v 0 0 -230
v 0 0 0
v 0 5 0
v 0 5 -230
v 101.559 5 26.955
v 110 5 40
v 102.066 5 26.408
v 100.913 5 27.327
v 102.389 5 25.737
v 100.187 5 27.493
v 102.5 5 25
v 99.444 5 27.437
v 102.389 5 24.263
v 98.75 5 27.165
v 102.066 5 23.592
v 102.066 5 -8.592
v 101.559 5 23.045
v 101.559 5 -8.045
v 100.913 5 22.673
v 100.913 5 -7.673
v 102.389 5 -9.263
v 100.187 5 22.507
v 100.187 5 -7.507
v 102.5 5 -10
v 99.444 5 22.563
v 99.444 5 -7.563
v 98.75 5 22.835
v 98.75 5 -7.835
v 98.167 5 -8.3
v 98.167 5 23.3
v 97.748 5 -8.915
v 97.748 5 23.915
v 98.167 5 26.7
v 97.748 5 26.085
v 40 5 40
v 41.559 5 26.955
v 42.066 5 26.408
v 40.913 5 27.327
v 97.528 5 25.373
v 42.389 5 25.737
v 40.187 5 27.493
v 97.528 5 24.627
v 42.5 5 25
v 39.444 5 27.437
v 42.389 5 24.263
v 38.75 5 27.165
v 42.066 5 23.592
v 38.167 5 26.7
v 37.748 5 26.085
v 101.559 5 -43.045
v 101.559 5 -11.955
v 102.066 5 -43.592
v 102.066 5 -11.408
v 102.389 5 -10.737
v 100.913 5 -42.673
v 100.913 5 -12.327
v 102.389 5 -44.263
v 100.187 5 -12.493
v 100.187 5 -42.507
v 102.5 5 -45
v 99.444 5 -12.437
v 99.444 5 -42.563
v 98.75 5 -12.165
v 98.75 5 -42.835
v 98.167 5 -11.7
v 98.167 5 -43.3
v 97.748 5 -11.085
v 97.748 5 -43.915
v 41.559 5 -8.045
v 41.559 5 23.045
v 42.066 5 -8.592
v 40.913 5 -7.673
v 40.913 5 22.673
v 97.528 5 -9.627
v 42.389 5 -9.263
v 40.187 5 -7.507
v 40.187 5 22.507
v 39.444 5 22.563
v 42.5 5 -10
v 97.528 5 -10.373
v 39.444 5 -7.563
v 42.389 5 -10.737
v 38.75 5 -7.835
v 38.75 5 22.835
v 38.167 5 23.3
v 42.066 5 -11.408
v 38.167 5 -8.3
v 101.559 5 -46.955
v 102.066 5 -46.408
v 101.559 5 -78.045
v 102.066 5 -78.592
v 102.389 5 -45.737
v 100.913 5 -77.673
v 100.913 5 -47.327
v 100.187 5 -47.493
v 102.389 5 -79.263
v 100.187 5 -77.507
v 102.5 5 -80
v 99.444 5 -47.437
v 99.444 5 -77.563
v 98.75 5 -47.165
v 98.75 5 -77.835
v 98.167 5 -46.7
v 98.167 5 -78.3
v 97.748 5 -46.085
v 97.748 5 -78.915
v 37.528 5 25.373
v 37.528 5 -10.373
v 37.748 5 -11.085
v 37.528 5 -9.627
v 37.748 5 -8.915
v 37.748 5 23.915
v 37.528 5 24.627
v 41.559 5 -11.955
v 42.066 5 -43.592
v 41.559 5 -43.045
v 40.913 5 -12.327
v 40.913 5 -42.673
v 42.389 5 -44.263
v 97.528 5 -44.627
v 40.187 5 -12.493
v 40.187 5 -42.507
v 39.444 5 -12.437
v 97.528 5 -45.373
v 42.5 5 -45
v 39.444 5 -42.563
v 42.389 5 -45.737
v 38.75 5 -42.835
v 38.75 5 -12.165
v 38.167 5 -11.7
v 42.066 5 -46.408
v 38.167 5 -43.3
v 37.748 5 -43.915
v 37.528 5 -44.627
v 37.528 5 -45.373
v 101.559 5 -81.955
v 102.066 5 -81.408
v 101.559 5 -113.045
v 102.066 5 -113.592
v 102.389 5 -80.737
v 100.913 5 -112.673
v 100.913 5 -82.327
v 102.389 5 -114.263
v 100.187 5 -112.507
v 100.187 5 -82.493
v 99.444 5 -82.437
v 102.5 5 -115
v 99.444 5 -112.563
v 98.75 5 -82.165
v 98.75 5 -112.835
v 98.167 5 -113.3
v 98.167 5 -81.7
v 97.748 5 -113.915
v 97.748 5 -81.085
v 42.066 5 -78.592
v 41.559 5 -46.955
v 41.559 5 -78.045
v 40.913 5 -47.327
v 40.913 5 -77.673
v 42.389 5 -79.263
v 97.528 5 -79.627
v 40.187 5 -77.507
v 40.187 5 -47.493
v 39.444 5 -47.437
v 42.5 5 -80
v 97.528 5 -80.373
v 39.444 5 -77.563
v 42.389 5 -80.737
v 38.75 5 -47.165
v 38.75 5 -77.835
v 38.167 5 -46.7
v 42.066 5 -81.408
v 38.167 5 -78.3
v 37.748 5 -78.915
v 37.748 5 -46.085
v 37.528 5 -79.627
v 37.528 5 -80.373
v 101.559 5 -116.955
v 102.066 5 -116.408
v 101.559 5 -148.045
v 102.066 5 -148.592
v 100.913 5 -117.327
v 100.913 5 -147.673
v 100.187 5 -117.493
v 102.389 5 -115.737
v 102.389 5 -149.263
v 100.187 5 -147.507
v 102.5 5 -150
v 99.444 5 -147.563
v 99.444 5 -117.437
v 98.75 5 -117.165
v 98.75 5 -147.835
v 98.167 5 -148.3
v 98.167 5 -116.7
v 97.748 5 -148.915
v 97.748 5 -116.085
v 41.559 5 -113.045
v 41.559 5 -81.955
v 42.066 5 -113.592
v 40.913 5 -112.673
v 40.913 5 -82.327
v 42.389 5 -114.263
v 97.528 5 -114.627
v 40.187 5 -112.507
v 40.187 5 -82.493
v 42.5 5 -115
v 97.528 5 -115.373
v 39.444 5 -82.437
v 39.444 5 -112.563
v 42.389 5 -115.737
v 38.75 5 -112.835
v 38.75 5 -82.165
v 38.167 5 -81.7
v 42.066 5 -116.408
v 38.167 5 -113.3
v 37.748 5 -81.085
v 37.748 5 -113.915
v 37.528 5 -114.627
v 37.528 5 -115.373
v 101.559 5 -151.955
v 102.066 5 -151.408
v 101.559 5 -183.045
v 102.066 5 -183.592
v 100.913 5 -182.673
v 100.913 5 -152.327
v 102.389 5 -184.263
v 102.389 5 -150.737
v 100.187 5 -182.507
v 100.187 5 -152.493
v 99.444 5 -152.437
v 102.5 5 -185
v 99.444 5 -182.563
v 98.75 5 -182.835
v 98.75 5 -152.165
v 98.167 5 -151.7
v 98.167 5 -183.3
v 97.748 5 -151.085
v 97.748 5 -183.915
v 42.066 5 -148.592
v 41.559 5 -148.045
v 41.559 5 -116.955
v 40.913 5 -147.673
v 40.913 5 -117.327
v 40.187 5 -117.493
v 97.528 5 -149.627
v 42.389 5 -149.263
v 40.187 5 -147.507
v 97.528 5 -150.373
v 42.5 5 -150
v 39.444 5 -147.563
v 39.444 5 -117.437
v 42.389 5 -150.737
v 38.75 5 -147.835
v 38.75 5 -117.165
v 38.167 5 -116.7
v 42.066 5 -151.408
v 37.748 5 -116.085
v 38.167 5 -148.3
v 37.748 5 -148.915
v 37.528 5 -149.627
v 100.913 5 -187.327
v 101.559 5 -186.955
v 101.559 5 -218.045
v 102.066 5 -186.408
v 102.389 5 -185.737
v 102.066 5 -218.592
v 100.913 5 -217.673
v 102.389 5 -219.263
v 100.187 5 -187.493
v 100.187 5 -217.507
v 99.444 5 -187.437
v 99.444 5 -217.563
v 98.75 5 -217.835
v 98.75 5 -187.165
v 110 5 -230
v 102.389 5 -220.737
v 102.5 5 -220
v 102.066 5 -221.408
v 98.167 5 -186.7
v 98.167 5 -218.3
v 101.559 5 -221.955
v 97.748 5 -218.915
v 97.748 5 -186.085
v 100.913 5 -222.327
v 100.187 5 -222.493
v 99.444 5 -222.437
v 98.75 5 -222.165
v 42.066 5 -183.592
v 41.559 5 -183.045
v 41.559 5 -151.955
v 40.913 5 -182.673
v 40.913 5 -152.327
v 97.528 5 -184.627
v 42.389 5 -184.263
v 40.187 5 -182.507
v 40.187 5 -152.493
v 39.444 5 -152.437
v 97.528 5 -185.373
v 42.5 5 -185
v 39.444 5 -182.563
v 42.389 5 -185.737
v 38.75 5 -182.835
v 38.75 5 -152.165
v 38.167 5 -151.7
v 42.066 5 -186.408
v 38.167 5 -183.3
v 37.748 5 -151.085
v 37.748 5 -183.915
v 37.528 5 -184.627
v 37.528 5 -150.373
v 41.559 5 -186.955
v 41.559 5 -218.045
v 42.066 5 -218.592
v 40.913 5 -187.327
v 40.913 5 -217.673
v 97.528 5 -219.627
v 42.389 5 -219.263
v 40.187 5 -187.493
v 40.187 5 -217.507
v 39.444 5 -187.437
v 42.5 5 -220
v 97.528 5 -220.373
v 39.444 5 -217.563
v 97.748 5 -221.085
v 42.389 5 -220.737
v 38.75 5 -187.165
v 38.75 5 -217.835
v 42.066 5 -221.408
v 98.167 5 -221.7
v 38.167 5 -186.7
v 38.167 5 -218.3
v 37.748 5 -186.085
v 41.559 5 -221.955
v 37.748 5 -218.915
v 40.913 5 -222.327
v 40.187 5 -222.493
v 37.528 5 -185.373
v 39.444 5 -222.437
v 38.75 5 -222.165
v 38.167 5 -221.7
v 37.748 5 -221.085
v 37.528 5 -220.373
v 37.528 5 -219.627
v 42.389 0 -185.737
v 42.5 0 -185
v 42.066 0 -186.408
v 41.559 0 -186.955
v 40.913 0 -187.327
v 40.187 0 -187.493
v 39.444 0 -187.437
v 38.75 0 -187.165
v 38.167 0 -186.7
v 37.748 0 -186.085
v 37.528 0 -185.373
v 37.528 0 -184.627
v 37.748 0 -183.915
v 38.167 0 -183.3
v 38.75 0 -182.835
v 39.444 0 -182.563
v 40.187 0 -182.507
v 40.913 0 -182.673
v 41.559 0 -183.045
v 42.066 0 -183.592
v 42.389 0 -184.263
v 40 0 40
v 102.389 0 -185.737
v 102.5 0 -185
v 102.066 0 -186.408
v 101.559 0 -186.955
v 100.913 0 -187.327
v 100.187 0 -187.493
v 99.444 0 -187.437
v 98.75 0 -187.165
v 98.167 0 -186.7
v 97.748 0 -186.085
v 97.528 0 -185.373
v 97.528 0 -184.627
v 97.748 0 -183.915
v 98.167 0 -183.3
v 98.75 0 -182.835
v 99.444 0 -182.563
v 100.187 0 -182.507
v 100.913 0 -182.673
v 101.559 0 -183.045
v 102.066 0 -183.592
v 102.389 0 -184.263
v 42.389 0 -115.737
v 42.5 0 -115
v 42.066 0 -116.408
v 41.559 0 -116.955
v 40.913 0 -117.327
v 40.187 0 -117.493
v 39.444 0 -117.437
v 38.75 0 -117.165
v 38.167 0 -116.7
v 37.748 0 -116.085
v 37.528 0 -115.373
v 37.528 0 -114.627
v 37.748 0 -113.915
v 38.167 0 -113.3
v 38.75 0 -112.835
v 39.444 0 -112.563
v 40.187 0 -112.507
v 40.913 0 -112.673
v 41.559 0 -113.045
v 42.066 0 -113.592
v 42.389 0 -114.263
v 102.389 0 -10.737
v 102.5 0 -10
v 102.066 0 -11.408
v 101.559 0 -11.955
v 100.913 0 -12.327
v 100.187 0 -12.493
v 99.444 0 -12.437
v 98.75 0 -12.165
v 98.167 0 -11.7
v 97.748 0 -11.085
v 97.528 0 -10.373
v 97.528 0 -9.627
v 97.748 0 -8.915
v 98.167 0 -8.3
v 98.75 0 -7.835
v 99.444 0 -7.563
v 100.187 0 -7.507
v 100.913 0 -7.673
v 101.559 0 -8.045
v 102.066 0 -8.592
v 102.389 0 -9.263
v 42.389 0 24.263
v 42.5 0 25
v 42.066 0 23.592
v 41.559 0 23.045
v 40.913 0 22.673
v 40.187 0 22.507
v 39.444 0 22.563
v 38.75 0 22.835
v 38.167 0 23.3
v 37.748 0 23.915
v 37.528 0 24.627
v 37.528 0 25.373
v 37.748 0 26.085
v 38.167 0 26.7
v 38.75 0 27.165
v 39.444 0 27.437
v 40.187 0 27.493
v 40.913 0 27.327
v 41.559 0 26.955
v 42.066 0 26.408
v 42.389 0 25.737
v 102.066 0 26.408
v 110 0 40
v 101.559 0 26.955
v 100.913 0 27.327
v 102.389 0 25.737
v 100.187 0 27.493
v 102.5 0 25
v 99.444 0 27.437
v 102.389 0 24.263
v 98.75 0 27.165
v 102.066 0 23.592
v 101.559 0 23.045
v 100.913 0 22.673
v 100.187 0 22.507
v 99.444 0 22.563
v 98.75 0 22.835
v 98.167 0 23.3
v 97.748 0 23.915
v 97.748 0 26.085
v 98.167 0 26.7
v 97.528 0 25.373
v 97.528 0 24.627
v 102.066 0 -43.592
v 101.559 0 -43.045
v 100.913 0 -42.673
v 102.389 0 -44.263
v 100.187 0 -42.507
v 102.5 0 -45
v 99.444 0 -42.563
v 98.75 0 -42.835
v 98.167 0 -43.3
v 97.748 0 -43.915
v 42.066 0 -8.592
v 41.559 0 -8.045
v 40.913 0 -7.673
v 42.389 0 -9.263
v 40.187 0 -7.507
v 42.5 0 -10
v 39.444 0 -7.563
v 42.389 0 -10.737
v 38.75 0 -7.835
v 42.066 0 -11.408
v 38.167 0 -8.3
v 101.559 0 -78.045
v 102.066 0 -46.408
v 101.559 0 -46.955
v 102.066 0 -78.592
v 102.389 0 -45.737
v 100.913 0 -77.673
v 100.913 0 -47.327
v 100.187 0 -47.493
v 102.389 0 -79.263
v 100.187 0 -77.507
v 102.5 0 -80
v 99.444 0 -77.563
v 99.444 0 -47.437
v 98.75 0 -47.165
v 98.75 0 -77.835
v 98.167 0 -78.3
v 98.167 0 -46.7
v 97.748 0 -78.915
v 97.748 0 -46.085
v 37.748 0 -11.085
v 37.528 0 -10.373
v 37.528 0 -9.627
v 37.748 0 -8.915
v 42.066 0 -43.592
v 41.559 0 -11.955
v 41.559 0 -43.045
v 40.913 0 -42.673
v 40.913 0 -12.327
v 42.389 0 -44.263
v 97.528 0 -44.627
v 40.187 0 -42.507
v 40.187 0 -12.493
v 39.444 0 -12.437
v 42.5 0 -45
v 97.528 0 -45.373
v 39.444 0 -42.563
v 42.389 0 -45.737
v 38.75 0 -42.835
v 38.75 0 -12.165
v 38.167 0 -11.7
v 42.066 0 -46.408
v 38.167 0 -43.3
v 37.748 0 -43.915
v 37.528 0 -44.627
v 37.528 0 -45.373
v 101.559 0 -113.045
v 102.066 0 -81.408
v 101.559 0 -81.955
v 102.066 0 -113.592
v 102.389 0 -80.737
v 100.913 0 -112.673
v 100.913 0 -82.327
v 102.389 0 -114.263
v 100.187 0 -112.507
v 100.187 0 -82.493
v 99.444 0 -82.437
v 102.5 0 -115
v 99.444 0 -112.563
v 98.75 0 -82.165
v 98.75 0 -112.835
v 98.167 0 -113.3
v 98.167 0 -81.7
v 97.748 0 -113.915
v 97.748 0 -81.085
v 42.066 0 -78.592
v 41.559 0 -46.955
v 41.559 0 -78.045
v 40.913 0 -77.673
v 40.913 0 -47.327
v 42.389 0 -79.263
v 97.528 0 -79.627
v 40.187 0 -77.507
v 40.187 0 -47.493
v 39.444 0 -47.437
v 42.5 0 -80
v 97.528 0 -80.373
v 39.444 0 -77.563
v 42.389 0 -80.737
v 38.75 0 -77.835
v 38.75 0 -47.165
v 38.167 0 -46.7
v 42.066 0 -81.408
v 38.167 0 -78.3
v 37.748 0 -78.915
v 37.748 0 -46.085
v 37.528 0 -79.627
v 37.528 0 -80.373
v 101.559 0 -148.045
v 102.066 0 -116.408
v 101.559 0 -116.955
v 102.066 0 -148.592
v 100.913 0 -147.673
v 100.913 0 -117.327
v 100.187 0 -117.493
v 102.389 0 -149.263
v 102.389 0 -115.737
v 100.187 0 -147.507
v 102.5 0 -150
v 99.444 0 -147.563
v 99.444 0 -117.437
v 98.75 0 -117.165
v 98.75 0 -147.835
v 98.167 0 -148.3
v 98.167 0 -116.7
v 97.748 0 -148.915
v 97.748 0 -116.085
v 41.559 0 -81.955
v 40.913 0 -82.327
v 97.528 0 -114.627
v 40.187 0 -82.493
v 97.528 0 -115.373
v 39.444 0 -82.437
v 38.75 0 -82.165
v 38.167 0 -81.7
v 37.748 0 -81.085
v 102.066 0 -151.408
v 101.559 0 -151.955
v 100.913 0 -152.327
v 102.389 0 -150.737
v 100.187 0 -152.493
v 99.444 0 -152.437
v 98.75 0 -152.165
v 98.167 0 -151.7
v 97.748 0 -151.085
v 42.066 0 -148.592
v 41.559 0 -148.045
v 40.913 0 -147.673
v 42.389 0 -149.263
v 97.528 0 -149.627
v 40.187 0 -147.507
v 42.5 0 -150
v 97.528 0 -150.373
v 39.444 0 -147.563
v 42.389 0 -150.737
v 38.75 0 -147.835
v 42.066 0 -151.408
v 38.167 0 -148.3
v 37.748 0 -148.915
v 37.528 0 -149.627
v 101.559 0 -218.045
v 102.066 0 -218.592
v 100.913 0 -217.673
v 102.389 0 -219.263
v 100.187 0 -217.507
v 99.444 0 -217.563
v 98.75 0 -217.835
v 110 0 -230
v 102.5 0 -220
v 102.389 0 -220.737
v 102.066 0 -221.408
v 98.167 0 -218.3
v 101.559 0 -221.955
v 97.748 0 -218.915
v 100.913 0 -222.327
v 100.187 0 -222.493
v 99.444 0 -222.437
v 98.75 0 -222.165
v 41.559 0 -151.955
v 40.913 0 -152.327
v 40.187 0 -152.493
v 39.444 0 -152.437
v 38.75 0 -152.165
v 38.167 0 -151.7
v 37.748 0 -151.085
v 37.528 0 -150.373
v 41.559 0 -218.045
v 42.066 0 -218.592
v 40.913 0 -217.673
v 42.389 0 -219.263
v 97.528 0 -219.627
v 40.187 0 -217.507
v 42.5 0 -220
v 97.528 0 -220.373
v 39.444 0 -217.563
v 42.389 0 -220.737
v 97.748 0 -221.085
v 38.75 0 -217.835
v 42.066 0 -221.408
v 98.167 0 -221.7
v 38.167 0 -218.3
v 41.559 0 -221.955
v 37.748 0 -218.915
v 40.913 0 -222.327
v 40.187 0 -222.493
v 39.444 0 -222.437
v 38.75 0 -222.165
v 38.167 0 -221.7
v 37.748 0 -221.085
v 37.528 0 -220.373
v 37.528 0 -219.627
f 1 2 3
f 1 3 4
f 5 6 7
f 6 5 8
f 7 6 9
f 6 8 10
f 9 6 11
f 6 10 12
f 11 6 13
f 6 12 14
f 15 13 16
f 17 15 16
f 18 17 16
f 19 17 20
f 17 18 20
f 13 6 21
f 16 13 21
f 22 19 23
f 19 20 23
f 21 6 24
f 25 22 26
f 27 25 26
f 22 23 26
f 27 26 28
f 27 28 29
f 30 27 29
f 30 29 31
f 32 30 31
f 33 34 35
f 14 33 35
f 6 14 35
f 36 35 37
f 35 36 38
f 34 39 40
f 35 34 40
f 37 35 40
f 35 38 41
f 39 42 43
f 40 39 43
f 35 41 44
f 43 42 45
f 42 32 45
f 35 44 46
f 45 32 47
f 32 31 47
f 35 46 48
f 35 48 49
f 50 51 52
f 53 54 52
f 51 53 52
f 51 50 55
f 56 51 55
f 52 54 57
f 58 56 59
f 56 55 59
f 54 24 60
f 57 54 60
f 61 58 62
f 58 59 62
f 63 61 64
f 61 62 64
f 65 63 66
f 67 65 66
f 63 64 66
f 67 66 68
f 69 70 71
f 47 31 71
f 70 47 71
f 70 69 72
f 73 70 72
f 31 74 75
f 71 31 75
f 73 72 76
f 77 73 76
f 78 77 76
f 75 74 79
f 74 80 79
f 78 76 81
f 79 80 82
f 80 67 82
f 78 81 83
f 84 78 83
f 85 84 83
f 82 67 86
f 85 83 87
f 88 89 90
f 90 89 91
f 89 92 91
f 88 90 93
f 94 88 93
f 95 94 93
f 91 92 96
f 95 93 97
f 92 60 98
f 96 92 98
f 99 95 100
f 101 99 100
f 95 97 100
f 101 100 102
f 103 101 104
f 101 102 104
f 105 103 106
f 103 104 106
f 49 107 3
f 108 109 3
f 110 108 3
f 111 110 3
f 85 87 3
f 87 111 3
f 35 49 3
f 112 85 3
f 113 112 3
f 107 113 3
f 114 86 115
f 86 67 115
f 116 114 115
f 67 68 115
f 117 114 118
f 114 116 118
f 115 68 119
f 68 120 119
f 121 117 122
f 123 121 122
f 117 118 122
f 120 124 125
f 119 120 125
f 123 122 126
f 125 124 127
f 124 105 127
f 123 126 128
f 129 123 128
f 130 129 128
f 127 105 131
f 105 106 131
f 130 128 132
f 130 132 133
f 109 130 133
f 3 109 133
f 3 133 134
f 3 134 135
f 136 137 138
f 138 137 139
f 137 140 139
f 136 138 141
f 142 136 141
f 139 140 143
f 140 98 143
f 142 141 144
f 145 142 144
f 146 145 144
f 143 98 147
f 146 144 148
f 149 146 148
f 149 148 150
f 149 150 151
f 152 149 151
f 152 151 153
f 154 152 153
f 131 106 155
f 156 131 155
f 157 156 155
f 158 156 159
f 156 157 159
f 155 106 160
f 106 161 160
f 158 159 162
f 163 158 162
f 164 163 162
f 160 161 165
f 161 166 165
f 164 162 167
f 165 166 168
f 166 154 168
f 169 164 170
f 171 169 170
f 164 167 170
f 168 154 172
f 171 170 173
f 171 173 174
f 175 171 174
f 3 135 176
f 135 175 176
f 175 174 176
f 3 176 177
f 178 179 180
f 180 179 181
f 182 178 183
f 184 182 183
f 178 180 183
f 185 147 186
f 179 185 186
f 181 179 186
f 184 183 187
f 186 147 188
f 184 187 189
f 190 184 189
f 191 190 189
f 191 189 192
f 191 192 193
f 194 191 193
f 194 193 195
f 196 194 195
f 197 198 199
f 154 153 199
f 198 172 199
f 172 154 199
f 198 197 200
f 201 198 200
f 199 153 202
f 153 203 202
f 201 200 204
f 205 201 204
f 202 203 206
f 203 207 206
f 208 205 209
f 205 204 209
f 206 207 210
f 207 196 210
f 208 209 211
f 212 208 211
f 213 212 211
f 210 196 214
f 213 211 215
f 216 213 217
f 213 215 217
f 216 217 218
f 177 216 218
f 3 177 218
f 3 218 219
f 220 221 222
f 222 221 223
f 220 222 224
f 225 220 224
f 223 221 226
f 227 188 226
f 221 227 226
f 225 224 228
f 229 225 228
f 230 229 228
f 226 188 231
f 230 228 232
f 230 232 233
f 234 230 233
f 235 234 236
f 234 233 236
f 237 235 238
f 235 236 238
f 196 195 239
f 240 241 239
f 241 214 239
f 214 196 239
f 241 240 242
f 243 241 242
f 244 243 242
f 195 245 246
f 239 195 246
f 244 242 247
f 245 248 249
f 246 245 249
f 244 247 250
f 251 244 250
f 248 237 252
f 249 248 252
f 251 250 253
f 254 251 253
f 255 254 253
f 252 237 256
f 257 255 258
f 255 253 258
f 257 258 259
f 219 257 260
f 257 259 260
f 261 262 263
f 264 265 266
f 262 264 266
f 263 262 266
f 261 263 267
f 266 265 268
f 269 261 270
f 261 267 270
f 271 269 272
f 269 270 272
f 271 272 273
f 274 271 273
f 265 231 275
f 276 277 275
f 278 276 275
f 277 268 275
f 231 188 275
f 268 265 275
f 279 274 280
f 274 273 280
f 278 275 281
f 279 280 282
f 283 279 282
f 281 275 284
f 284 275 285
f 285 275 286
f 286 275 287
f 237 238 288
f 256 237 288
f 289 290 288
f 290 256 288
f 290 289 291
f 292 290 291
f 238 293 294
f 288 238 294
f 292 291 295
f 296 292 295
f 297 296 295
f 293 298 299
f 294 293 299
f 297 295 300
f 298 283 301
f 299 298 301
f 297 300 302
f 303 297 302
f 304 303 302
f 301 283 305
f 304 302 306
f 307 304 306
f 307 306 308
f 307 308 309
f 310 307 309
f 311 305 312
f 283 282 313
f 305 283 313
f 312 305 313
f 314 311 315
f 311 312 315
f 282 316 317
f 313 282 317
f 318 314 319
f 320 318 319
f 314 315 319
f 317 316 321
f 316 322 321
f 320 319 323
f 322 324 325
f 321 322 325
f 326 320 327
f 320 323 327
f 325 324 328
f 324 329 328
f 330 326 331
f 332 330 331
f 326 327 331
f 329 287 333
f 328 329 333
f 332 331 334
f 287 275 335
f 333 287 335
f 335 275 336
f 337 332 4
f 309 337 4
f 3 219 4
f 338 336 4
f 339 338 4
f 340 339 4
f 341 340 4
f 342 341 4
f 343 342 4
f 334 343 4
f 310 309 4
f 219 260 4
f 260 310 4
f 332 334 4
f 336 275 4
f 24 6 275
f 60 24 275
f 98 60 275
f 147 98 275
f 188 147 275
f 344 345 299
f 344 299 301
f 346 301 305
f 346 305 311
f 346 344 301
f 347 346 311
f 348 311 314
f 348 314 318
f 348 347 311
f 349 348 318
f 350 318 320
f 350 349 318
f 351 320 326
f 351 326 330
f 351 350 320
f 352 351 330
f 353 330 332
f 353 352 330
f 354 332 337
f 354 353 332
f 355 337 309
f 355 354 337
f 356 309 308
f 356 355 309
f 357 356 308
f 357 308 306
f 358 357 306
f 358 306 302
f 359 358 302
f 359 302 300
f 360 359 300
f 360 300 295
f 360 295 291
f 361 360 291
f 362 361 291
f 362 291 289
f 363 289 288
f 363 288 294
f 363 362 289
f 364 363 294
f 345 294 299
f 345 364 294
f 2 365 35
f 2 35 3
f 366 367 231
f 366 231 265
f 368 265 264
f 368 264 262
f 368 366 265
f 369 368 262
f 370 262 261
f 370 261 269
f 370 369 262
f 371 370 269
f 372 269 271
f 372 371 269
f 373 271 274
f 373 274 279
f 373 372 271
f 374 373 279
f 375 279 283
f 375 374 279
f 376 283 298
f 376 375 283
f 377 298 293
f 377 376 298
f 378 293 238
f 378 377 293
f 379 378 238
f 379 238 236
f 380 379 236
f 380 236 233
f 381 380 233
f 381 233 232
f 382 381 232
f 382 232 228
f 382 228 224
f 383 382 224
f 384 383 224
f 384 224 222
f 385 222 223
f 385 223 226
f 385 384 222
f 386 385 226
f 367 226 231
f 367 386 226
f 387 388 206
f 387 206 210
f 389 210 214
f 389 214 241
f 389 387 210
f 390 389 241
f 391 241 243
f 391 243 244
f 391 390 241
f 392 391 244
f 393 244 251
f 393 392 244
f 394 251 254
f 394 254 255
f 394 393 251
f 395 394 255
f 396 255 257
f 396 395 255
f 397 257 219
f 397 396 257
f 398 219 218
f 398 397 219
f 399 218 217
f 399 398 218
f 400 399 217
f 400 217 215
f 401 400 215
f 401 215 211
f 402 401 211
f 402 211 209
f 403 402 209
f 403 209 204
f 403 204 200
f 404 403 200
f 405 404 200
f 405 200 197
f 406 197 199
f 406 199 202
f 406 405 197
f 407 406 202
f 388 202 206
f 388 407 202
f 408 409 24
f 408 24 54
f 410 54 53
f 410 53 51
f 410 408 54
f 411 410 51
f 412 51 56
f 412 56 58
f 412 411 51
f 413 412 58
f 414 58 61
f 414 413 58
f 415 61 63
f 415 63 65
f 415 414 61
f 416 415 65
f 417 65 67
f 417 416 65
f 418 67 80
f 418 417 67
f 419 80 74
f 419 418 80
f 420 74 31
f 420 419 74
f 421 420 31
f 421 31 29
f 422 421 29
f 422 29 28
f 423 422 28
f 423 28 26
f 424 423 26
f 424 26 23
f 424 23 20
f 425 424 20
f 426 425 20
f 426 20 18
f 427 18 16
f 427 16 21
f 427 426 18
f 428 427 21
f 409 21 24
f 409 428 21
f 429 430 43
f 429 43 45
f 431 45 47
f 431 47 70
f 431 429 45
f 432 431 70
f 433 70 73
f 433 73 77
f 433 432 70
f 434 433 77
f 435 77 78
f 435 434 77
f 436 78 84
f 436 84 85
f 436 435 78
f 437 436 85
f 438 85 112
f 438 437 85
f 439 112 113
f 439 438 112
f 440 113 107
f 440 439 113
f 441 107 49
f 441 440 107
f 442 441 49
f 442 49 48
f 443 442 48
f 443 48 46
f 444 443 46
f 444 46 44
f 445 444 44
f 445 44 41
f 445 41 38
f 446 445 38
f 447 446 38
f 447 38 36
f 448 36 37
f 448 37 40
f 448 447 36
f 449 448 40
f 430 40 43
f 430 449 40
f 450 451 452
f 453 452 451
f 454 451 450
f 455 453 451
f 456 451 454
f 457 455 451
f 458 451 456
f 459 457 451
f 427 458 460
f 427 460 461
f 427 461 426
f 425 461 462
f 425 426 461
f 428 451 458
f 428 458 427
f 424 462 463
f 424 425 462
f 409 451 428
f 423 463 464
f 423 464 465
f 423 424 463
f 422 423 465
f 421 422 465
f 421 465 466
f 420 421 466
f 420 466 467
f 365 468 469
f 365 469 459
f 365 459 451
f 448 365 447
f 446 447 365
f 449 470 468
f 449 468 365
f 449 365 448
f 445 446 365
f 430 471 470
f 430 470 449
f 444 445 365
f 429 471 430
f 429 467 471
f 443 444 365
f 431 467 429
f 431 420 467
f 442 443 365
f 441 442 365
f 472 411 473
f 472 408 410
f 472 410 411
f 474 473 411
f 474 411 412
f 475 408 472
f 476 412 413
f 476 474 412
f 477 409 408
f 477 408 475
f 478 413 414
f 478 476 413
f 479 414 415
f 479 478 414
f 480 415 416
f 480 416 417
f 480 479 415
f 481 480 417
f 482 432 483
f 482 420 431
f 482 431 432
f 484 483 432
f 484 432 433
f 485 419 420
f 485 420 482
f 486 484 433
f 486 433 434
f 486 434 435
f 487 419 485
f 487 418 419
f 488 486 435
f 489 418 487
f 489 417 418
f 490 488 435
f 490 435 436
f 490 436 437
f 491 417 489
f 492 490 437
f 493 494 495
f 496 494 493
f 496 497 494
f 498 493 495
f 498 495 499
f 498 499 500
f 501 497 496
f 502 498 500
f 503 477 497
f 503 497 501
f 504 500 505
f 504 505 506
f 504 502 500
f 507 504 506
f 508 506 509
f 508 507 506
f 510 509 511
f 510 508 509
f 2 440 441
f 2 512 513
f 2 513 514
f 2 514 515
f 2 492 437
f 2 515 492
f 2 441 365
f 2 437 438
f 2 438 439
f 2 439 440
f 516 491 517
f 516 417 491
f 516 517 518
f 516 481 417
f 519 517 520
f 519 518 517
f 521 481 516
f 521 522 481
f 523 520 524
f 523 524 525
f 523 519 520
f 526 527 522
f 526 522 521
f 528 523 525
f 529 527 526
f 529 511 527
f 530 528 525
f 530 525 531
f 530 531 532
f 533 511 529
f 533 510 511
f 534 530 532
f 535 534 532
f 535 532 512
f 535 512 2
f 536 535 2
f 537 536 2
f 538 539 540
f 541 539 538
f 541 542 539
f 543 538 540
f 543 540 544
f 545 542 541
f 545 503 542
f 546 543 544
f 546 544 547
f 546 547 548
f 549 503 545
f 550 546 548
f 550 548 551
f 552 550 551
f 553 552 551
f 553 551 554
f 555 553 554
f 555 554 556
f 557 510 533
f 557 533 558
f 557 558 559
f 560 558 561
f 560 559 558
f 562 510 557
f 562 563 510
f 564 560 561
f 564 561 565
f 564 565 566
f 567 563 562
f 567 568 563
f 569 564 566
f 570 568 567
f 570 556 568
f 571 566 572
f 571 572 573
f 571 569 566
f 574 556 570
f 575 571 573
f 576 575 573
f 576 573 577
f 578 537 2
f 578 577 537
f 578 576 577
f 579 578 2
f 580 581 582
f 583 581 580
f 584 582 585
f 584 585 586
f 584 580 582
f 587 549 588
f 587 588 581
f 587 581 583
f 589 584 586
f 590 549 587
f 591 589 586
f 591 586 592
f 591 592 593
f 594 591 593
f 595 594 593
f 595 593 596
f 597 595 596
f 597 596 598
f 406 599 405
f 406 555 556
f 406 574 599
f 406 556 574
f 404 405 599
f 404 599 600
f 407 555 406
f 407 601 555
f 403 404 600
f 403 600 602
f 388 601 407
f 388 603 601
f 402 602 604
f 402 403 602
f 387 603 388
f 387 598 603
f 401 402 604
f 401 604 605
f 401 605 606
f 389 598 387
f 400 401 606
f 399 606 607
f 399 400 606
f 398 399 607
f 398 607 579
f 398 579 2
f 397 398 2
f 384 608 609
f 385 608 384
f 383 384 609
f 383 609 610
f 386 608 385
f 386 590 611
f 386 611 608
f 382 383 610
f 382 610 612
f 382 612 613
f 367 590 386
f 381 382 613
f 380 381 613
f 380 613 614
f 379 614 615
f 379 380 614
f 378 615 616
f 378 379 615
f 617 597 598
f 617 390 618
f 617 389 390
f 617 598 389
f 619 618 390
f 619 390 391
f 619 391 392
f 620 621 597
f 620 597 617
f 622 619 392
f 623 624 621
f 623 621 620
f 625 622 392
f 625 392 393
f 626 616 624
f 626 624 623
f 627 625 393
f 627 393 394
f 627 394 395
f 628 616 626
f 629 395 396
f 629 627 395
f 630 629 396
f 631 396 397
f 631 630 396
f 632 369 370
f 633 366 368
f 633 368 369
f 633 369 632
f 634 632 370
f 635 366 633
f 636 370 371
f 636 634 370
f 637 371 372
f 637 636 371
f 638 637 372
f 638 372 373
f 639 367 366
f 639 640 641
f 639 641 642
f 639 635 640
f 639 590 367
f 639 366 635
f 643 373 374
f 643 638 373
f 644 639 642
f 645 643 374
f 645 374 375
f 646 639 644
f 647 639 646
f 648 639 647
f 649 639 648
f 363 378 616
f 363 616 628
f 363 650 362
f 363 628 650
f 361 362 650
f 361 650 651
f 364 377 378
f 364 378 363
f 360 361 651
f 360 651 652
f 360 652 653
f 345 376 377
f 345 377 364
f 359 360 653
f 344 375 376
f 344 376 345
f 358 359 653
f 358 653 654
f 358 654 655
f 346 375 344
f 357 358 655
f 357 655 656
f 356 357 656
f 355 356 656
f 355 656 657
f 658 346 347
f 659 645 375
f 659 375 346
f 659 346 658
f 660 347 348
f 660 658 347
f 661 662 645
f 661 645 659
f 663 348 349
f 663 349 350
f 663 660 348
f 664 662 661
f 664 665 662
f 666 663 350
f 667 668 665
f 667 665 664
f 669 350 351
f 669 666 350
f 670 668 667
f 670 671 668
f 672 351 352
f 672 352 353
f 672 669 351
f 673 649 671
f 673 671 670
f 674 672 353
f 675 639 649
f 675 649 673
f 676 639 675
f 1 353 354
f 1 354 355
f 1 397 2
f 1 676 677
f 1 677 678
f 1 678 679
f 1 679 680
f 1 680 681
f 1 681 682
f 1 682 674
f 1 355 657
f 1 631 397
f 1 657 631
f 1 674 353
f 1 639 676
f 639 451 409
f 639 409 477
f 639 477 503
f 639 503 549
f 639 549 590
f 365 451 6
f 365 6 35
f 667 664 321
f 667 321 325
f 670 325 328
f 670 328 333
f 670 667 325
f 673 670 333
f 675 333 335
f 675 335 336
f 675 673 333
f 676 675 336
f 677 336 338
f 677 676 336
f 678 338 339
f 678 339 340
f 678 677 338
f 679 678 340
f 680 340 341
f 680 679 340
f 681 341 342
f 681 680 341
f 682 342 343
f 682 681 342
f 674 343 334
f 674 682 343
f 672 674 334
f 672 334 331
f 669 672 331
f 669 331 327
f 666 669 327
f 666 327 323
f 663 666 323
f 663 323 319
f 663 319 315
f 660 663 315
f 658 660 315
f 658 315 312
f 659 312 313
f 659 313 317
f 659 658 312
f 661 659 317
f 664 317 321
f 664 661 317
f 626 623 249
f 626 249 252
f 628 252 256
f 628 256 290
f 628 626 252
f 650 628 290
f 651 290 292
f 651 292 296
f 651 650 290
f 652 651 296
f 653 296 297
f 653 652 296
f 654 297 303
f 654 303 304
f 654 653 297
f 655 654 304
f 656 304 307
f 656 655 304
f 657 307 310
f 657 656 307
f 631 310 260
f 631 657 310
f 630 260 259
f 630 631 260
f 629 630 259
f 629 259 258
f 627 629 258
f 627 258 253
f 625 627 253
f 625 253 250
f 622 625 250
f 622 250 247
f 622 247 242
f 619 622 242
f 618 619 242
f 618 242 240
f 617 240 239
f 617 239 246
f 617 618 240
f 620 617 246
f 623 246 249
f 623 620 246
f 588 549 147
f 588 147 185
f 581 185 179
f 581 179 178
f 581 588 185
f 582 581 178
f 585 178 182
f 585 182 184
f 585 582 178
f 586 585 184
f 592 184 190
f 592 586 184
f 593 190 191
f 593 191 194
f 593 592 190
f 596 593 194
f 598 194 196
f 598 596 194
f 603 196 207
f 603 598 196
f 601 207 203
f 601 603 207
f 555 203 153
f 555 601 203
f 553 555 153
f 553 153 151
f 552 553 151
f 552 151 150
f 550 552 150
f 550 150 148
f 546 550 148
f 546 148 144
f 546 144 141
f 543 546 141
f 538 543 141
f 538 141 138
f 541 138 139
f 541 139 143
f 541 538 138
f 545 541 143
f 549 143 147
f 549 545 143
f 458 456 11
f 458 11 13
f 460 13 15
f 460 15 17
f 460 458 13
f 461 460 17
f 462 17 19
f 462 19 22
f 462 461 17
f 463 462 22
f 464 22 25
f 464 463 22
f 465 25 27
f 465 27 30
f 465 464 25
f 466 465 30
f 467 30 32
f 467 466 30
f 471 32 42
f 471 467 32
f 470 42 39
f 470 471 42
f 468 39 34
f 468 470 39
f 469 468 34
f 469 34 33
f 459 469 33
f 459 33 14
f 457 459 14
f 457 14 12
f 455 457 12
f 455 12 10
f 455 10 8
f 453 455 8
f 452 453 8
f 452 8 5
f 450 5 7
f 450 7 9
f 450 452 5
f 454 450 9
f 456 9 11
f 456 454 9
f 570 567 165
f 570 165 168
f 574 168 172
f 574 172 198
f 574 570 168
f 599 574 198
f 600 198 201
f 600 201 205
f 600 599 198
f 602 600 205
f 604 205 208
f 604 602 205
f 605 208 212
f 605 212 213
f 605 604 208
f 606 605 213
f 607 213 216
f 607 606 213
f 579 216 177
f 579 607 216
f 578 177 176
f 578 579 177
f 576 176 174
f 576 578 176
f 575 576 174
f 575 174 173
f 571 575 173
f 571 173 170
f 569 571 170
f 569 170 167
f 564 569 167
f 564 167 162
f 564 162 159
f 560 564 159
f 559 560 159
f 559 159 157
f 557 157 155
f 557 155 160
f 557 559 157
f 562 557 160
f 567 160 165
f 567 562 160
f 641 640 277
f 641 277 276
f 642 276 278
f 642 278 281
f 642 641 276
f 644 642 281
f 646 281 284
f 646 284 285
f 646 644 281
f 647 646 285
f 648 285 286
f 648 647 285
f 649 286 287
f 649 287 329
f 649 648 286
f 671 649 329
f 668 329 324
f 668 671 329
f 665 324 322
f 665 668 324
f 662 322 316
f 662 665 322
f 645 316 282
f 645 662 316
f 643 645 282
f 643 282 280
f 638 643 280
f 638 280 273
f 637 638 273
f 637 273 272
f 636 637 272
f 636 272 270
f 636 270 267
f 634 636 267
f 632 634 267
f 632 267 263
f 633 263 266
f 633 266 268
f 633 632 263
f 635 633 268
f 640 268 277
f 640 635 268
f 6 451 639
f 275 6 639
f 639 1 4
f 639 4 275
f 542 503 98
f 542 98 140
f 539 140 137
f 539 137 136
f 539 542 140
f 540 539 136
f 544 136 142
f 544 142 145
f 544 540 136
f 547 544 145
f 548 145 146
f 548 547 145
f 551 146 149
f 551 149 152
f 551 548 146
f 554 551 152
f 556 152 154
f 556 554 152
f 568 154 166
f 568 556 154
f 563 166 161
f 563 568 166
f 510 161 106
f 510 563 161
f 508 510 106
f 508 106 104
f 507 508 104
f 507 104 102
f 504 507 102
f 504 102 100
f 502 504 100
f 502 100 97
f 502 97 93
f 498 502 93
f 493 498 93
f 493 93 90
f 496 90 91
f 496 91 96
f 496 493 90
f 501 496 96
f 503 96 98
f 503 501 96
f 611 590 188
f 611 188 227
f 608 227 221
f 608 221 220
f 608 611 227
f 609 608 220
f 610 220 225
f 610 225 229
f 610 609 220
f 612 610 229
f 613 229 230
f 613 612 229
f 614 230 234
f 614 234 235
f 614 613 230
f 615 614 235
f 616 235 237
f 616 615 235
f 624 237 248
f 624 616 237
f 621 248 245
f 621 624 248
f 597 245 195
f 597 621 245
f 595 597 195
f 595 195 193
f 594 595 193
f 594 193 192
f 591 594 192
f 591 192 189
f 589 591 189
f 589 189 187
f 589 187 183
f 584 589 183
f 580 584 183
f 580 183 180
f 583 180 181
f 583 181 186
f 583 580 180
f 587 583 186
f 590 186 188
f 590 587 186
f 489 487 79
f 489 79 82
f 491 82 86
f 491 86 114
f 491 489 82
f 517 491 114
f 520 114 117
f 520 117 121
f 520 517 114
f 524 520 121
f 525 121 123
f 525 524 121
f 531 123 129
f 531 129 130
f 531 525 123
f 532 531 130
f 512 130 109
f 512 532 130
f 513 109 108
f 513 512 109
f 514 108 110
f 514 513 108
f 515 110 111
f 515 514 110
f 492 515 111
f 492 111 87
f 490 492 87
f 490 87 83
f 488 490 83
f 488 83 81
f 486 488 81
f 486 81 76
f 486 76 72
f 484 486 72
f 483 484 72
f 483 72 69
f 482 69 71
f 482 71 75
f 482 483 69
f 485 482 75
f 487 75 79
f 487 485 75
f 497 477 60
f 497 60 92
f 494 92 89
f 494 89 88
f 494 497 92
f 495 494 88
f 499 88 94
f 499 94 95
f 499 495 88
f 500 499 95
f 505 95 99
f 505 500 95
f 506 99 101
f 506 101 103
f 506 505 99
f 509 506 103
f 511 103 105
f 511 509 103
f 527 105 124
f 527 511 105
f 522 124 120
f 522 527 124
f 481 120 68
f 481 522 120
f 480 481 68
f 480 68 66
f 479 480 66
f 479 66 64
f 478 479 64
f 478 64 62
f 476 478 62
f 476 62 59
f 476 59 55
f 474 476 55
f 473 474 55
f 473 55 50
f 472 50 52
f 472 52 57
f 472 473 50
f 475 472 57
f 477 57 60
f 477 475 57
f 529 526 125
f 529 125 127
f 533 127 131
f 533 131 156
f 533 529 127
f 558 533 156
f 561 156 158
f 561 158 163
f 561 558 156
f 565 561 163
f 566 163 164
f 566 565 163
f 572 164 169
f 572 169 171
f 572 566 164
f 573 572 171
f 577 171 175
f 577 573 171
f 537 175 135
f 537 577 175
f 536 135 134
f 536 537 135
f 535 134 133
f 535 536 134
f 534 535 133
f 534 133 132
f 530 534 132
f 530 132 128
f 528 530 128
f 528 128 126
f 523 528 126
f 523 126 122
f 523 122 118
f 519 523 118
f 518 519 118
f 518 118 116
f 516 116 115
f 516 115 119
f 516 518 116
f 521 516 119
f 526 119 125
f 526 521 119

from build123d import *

# Parameters (mm, degrees)
SKETCH1_R           = 2.5
BOSS_EXTRUDE1_DEPTH = 5


with BuildPart() as part:
    # Sketch1 → Boss-Extrude1 (new body)
    with BuildSketch(Plane(origin=(0, 0, 0), x_dir=(1, 0, 0), z_dir=(0, 1, 0))):
        Polygon((0, 0), (0, 230), (110, 230), (110, -35), (110, -40), (40, -40), align=None)
        with Locations((40, 220)):
            Circle(SKETCH1_R, mode=Mode.SUBTRACT)
        with Locations((100, 220)):
            Circle(SKETCH1_R, mode=Mode.SUBTRACT)
        with Locations((40, 185)):
            Circle(SKETCH1_R, mode=Mode.SUBTRACT)
        with Locations((100, 185)):
            Circle(SKETCH1_R, mode=Mode.SUBTRACT)
        with Locations((40, 150)):
            Circle(SKETCH1_R, mode=Mode.SUBTRACT)
        with Locations((100, 150)):
            Circle(SKETCH1_R, mode=Mode.SUBTRACT)
        with Locations((40, 115)):
            Circle(SKETCH1_R, mode=Mode.SUBTRACT)
        with Locations((100, 115)):
            Circle(SKETCH1_R, mode=Mode.SUBTRACT)
        with Locations((40, 80)):
            Circle(SKETCH1_R, mode=Mode.SUBTRACT)
        with Locations((100, 80)):
            Circle(SKETCH1_R, mode=Mode.SUBTRACT)
        with Locations((40, 45)):
            Circle(SKETCH1_R, mode=Mode.SUBTRACT)
        with Locations((100, 45)):
            Circle(SKETCH1_R, mode=Mode.SUBTRACT)
        with Locations((40, 10)):
            Circle(SKETCH1_R, mode=Mode.SUBTRACT)
        with Locations((100, 10)):
            Circle(SKETCH1_R, mode=Mode.SUBTRACT)
        with Locations((40, -25)):
            Circle(SKETCH1_R, mode=Mode.SUBTRACT)
        with Locations((100, -25)):
            Circle(SKETCH1_R, mode=Mode.SUBTRACT)
    extrude(amount=BOSS_EXTRUDE1_DEPTH)


solid = part.part
